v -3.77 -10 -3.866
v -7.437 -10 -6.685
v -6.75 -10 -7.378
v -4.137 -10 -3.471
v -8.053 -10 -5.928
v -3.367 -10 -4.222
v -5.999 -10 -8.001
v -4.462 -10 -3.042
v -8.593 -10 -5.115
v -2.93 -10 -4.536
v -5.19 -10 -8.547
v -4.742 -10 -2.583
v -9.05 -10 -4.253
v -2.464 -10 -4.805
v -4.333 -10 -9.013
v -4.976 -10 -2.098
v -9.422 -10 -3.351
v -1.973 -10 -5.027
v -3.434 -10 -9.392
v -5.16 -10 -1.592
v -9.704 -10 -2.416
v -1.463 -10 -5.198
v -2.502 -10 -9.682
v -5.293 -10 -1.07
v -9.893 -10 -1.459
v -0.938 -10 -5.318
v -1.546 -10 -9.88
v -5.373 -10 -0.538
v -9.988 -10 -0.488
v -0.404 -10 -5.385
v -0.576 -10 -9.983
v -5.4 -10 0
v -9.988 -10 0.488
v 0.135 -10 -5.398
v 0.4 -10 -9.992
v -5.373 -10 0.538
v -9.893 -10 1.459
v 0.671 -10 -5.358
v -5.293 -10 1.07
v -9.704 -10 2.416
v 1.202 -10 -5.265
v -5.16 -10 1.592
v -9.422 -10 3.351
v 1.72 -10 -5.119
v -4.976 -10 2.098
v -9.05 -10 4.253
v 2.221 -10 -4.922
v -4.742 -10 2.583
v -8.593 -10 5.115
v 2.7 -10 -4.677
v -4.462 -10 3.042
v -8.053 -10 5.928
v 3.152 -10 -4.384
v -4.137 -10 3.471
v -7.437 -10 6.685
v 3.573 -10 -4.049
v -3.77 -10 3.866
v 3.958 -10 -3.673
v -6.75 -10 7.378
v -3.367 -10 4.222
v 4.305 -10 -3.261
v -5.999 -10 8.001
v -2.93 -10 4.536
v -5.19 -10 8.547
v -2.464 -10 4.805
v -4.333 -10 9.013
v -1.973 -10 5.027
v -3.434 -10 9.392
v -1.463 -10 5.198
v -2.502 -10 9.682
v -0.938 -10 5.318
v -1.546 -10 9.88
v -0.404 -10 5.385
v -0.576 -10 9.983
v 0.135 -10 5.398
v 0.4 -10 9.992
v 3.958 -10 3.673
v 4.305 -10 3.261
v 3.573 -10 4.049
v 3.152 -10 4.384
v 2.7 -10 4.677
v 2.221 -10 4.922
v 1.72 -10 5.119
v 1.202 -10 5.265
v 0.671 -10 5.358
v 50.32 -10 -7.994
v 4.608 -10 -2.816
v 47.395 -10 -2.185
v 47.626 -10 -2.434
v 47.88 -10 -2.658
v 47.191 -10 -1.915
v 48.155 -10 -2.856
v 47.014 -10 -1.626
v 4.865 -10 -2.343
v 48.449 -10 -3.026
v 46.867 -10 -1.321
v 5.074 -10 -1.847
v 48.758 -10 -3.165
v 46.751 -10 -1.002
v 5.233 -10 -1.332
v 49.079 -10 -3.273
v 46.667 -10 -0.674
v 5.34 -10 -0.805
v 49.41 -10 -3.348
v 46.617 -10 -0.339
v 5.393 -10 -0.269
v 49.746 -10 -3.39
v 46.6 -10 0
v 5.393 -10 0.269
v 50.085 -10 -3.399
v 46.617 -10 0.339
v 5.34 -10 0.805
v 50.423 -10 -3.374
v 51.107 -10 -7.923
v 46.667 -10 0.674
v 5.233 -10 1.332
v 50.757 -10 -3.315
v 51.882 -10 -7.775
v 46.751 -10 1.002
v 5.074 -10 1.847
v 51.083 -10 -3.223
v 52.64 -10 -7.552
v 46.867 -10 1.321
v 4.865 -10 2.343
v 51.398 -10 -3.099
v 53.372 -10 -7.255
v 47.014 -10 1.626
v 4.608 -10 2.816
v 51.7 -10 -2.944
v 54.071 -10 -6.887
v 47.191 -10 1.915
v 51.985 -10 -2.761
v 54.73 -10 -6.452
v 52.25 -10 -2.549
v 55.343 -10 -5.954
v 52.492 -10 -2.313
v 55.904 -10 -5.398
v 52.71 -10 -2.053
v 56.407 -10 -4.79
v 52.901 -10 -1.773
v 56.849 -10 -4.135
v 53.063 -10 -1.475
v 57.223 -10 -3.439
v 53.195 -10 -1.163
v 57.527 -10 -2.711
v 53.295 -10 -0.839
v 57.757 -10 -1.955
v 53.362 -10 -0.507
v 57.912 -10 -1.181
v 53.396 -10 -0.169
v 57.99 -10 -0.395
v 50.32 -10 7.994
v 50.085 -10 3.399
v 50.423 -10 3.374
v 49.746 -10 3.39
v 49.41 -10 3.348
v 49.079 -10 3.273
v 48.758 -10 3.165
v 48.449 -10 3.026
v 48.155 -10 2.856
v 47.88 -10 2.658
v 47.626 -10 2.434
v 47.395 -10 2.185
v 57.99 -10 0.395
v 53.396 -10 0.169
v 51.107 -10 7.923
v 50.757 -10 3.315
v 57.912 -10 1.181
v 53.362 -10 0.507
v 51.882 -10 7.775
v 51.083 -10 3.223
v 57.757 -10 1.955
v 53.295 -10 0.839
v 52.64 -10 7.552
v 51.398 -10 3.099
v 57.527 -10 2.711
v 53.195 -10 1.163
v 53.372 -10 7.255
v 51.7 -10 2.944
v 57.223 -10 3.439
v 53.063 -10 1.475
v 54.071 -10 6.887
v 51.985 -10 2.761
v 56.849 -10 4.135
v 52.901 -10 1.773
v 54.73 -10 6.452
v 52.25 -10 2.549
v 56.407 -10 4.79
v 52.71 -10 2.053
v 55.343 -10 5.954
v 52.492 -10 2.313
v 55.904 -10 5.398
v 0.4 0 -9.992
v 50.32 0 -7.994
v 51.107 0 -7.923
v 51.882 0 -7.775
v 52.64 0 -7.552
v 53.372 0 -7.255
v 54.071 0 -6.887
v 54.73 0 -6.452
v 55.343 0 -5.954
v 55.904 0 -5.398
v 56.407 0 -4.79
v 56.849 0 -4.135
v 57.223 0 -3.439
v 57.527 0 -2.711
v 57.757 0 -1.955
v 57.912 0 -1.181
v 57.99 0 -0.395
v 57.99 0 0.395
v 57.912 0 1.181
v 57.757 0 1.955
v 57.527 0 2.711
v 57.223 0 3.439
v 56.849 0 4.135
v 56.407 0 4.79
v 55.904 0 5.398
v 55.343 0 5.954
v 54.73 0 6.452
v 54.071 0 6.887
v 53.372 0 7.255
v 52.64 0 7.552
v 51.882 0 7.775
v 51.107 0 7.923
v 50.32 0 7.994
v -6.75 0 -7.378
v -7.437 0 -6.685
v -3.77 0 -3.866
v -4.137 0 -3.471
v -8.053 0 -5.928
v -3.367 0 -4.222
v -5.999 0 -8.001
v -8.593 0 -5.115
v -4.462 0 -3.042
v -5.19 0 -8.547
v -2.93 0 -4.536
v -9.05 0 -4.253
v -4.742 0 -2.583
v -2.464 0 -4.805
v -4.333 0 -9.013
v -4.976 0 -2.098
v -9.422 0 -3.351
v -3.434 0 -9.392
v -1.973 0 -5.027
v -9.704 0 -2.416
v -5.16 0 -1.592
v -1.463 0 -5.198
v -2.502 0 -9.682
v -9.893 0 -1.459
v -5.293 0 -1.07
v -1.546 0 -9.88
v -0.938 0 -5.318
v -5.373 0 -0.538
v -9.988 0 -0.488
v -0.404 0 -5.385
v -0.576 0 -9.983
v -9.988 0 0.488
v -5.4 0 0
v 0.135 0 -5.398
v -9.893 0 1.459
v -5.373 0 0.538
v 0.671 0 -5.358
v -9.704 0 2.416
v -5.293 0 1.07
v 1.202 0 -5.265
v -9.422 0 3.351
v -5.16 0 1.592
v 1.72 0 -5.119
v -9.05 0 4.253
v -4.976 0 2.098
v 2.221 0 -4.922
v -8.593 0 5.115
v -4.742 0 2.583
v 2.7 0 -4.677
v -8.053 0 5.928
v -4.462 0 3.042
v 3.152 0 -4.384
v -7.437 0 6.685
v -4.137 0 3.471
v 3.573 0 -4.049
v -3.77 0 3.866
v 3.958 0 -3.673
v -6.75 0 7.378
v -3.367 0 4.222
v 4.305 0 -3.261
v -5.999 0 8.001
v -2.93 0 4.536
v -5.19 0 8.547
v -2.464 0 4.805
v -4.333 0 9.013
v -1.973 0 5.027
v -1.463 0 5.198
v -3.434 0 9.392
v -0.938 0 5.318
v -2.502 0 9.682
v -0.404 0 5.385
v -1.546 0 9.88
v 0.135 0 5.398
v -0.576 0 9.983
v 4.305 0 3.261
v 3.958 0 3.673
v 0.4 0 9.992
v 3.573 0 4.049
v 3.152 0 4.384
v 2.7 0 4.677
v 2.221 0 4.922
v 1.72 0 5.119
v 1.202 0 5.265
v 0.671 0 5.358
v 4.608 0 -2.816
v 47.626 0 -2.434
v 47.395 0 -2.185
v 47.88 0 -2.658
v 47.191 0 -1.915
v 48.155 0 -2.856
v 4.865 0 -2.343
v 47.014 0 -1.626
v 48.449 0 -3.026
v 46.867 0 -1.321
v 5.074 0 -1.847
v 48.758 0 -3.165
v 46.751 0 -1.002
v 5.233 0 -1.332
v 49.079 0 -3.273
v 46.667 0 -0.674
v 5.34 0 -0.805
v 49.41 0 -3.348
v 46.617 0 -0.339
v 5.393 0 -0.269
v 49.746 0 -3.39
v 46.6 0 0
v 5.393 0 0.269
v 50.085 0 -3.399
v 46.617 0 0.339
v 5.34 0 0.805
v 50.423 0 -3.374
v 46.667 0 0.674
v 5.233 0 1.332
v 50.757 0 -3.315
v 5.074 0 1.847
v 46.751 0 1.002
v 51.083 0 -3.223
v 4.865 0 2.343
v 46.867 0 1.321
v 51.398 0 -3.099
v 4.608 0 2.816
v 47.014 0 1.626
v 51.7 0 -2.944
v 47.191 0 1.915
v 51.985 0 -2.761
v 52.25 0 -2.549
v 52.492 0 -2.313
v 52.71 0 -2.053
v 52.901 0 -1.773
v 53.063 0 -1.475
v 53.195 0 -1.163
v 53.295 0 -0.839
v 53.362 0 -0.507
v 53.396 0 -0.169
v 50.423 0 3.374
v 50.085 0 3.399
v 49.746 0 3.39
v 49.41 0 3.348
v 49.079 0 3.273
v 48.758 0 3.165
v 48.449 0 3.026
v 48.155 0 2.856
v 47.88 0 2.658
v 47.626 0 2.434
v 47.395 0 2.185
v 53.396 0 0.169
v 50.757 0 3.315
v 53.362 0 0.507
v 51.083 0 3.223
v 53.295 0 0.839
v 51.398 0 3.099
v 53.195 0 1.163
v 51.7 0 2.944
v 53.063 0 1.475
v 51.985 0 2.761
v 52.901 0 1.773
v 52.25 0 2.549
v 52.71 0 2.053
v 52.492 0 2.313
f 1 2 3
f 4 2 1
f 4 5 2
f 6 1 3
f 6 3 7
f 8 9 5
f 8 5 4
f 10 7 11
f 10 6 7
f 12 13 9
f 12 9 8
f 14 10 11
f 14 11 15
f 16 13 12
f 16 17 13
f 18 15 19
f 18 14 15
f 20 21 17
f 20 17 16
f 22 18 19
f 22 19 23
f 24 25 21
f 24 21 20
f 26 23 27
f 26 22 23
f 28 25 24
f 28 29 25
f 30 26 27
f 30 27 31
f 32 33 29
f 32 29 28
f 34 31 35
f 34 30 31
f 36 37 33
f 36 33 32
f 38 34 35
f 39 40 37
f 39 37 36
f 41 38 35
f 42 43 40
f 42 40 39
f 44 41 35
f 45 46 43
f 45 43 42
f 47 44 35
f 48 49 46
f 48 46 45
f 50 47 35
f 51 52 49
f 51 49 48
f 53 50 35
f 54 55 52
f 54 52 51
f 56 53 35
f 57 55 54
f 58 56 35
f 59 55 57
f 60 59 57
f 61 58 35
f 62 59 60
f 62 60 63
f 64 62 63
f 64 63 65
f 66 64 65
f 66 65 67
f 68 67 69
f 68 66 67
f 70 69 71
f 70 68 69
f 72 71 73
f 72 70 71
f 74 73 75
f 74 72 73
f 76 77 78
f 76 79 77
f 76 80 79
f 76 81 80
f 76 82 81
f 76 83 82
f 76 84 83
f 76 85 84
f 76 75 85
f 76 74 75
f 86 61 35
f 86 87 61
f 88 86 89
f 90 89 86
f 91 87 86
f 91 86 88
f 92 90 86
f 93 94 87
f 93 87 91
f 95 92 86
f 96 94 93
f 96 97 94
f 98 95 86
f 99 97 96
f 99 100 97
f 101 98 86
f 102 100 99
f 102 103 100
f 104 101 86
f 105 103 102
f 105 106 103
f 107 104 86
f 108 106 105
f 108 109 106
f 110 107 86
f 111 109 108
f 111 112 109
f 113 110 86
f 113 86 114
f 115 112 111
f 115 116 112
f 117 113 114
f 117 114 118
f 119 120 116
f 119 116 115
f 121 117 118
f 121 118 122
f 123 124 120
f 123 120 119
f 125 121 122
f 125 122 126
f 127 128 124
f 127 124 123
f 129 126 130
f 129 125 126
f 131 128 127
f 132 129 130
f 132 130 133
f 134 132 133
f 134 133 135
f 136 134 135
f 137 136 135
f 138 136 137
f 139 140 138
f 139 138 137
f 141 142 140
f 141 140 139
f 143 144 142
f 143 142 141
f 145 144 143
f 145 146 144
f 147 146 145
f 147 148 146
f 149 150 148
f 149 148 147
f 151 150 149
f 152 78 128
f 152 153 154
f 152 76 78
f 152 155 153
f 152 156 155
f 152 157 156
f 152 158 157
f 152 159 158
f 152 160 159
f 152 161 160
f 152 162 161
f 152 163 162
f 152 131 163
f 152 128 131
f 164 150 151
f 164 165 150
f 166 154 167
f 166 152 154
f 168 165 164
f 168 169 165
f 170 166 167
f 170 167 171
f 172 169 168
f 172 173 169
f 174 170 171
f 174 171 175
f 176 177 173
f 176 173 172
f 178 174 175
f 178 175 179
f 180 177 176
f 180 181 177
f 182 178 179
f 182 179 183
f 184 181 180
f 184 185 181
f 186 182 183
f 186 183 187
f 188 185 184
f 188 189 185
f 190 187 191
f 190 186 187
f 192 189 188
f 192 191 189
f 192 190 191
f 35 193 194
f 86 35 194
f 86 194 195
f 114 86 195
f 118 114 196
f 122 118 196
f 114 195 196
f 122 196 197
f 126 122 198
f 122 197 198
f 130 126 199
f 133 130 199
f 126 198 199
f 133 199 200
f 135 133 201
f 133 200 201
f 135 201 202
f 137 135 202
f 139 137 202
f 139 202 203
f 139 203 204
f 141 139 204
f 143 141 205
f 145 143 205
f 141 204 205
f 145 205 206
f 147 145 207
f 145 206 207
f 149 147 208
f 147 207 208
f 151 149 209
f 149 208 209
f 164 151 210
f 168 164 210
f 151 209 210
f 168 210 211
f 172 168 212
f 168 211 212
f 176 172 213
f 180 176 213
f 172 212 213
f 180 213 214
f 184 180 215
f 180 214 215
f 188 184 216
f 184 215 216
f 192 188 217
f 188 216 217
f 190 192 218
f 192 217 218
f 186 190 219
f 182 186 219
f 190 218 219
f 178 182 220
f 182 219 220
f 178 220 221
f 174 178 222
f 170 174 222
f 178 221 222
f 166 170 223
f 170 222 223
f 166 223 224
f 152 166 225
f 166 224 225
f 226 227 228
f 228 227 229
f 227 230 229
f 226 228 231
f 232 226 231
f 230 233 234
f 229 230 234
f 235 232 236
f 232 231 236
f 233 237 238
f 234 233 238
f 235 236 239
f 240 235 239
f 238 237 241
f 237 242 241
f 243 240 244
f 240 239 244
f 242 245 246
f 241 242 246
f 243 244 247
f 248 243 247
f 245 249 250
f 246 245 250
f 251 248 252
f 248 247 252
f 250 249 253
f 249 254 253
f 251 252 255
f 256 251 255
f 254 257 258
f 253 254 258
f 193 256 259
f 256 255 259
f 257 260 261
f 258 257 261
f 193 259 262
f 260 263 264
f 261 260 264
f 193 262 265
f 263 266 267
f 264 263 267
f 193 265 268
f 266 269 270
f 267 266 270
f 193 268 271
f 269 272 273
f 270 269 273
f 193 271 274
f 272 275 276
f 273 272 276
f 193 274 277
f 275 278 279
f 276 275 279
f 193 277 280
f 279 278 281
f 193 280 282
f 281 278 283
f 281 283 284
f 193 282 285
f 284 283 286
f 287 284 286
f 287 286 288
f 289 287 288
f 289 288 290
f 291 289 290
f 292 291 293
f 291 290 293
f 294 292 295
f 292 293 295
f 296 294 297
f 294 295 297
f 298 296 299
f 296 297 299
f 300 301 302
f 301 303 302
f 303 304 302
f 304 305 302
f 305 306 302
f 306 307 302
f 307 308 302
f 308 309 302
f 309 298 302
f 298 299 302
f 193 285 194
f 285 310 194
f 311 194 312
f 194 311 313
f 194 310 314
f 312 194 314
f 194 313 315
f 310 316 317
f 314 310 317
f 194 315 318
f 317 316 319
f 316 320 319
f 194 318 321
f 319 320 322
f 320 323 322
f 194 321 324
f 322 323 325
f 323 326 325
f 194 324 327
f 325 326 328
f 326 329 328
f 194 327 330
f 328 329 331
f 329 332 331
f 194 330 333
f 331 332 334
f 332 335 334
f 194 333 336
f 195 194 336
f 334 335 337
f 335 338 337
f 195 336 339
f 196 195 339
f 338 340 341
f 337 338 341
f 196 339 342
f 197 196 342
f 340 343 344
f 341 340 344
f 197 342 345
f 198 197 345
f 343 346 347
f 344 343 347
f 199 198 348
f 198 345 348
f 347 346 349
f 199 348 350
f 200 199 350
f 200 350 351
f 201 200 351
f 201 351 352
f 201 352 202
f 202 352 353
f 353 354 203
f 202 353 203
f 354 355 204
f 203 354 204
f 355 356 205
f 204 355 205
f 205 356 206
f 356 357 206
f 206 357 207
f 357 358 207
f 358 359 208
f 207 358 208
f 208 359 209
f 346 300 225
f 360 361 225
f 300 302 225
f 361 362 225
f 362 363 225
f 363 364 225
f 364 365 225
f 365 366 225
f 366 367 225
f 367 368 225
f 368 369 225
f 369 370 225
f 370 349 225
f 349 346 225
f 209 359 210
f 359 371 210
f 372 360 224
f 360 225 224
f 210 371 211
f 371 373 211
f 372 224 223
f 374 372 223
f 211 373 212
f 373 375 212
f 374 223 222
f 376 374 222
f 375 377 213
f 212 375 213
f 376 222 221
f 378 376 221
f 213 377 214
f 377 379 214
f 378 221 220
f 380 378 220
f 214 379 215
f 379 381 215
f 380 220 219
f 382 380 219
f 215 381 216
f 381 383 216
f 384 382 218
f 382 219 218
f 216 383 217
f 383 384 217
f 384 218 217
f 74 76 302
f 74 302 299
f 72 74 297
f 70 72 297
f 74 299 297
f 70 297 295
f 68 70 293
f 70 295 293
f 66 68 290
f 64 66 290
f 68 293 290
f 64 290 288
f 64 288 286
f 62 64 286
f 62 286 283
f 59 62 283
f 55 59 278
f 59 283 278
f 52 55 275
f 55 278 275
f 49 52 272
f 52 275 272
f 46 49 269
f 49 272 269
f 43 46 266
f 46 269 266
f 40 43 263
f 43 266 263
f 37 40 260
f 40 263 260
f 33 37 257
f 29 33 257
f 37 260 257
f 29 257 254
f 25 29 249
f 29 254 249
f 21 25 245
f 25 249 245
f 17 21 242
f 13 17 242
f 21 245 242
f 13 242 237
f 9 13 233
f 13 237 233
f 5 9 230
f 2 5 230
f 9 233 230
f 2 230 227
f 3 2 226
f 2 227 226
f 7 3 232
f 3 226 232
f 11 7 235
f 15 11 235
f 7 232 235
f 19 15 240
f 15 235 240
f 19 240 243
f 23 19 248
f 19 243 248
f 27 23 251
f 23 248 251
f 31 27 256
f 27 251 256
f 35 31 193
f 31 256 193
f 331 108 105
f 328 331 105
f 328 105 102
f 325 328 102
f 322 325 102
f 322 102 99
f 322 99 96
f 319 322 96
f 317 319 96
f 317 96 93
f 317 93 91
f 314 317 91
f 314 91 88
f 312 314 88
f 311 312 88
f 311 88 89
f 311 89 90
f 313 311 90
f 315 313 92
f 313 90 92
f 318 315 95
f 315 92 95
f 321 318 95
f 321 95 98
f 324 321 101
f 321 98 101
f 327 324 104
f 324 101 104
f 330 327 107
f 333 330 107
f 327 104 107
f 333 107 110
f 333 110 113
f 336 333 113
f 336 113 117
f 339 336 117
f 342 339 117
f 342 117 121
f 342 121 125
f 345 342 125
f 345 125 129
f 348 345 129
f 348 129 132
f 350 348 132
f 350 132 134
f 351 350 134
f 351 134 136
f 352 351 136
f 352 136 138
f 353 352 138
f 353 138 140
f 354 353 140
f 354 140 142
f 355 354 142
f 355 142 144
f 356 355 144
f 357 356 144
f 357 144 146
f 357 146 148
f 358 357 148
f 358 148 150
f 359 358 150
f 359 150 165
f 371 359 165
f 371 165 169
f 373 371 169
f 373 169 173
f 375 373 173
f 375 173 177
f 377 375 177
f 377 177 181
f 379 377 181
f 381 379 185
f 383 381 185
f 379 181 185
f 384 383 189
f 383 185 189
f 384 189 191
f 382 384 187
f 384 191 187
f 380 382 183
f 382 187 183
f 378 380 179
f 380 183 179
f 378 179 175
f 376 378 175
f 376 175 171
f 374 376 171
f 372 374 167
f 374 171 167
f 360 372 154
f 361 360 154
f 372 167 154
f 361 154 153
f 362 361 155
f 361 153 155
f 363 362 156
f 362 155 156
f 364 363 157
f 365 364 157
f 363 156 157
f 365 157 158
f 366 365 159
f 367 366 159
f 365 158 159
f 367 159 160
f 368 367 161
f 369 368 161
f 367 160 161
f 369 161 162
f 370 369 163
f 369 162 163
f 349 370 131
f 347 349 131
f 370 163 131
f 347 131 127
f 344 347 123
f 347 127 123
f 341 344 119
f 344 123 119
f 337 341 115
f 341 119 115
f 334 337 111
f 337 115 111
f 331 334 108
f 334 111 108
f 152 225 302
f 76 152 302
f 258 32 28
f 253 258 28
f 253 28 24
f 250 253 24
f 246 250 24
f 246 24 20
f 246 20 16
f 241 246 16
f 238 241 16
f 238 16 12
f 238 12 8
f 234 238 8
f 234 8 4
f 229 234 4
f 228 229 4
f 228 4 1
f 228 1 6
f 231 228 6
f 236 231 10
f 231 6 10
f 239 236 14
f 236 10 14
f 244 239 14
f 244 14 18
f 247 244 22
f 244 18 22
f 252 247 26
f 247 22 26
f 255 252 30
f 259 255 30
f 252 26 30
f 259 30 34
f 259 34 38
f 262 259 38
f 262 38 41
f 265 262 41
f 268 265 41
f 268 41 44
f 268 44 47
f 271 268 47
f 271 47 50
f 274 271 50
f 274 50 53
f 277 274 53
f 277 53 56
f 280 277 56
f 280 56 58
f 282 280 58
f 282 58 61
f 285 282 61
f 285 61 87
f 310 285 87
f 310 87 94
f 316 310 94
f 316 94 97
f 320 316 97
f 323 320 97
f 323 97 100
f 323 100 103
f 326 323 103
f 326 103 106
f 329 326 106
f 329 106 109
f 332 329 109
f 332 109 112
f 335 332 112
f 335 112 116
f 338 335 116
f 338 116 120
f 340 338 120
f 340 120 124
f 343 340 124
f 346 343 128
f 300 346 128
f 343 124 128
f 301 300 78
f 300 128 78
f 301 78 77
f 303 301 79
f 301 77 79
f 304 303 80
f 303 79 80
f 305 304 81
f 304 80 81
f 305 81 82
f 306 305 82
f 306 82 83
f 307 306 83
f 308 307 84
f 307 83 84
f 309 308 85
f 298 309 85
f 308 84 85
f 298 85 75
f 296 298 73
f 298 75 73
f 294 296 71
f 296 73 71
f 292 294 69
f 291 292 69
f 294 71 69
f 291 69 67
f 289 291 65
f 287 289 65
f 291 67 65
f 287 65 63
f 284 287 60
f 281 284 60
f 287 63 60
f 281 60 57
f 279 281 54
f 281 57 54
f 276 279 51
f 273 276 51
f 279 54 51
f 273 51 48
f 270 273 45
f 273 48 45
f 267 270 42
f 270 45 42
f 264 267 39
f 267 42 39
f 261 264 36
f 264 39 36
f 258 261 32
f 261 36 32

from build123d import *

# Parameters (mm, degrees)
F1_DEPTH = 10
F2_D     = 10.8
F3_D     = 6.8


with BuildPart() as f1:
    # F0 (on Front) → F1 (new body)
    with BuildSketch(Plane.XZ):
        with BuildLine():
            Line((50.32, 7.9935974379), (0.4, 9.9919967974))
            ThreePointArc((0.4, 9.9919967974), (-10, 0), (0.4, -9.9919967974))
            Line((0.4, -9.9919967974), (50.32, -7.9935974379))
            ThreePointArc((50.32, -7.9935974379), (58, 0), (50.32, 7.9935974379))
        make_face()
    extrude(amount=F1_DEPTH)

    # F2 (through all)
    with Locations(Plane(origin=(0, 0, 0), x_dir=(1, 0, 0), z_dir=(0, 1, 0))):
        with Locations((0, 0)):
            Hole(F2_D / 2)

    # F3 (through all)
    with Locations(Plane(origin=(0, 0, 0), x_dir=(1, 0, 0), z_dir=(0, 1, 0))):
        with Locations((50, 0)):
            Hole(F3_D / 2)


solid = f1.part
